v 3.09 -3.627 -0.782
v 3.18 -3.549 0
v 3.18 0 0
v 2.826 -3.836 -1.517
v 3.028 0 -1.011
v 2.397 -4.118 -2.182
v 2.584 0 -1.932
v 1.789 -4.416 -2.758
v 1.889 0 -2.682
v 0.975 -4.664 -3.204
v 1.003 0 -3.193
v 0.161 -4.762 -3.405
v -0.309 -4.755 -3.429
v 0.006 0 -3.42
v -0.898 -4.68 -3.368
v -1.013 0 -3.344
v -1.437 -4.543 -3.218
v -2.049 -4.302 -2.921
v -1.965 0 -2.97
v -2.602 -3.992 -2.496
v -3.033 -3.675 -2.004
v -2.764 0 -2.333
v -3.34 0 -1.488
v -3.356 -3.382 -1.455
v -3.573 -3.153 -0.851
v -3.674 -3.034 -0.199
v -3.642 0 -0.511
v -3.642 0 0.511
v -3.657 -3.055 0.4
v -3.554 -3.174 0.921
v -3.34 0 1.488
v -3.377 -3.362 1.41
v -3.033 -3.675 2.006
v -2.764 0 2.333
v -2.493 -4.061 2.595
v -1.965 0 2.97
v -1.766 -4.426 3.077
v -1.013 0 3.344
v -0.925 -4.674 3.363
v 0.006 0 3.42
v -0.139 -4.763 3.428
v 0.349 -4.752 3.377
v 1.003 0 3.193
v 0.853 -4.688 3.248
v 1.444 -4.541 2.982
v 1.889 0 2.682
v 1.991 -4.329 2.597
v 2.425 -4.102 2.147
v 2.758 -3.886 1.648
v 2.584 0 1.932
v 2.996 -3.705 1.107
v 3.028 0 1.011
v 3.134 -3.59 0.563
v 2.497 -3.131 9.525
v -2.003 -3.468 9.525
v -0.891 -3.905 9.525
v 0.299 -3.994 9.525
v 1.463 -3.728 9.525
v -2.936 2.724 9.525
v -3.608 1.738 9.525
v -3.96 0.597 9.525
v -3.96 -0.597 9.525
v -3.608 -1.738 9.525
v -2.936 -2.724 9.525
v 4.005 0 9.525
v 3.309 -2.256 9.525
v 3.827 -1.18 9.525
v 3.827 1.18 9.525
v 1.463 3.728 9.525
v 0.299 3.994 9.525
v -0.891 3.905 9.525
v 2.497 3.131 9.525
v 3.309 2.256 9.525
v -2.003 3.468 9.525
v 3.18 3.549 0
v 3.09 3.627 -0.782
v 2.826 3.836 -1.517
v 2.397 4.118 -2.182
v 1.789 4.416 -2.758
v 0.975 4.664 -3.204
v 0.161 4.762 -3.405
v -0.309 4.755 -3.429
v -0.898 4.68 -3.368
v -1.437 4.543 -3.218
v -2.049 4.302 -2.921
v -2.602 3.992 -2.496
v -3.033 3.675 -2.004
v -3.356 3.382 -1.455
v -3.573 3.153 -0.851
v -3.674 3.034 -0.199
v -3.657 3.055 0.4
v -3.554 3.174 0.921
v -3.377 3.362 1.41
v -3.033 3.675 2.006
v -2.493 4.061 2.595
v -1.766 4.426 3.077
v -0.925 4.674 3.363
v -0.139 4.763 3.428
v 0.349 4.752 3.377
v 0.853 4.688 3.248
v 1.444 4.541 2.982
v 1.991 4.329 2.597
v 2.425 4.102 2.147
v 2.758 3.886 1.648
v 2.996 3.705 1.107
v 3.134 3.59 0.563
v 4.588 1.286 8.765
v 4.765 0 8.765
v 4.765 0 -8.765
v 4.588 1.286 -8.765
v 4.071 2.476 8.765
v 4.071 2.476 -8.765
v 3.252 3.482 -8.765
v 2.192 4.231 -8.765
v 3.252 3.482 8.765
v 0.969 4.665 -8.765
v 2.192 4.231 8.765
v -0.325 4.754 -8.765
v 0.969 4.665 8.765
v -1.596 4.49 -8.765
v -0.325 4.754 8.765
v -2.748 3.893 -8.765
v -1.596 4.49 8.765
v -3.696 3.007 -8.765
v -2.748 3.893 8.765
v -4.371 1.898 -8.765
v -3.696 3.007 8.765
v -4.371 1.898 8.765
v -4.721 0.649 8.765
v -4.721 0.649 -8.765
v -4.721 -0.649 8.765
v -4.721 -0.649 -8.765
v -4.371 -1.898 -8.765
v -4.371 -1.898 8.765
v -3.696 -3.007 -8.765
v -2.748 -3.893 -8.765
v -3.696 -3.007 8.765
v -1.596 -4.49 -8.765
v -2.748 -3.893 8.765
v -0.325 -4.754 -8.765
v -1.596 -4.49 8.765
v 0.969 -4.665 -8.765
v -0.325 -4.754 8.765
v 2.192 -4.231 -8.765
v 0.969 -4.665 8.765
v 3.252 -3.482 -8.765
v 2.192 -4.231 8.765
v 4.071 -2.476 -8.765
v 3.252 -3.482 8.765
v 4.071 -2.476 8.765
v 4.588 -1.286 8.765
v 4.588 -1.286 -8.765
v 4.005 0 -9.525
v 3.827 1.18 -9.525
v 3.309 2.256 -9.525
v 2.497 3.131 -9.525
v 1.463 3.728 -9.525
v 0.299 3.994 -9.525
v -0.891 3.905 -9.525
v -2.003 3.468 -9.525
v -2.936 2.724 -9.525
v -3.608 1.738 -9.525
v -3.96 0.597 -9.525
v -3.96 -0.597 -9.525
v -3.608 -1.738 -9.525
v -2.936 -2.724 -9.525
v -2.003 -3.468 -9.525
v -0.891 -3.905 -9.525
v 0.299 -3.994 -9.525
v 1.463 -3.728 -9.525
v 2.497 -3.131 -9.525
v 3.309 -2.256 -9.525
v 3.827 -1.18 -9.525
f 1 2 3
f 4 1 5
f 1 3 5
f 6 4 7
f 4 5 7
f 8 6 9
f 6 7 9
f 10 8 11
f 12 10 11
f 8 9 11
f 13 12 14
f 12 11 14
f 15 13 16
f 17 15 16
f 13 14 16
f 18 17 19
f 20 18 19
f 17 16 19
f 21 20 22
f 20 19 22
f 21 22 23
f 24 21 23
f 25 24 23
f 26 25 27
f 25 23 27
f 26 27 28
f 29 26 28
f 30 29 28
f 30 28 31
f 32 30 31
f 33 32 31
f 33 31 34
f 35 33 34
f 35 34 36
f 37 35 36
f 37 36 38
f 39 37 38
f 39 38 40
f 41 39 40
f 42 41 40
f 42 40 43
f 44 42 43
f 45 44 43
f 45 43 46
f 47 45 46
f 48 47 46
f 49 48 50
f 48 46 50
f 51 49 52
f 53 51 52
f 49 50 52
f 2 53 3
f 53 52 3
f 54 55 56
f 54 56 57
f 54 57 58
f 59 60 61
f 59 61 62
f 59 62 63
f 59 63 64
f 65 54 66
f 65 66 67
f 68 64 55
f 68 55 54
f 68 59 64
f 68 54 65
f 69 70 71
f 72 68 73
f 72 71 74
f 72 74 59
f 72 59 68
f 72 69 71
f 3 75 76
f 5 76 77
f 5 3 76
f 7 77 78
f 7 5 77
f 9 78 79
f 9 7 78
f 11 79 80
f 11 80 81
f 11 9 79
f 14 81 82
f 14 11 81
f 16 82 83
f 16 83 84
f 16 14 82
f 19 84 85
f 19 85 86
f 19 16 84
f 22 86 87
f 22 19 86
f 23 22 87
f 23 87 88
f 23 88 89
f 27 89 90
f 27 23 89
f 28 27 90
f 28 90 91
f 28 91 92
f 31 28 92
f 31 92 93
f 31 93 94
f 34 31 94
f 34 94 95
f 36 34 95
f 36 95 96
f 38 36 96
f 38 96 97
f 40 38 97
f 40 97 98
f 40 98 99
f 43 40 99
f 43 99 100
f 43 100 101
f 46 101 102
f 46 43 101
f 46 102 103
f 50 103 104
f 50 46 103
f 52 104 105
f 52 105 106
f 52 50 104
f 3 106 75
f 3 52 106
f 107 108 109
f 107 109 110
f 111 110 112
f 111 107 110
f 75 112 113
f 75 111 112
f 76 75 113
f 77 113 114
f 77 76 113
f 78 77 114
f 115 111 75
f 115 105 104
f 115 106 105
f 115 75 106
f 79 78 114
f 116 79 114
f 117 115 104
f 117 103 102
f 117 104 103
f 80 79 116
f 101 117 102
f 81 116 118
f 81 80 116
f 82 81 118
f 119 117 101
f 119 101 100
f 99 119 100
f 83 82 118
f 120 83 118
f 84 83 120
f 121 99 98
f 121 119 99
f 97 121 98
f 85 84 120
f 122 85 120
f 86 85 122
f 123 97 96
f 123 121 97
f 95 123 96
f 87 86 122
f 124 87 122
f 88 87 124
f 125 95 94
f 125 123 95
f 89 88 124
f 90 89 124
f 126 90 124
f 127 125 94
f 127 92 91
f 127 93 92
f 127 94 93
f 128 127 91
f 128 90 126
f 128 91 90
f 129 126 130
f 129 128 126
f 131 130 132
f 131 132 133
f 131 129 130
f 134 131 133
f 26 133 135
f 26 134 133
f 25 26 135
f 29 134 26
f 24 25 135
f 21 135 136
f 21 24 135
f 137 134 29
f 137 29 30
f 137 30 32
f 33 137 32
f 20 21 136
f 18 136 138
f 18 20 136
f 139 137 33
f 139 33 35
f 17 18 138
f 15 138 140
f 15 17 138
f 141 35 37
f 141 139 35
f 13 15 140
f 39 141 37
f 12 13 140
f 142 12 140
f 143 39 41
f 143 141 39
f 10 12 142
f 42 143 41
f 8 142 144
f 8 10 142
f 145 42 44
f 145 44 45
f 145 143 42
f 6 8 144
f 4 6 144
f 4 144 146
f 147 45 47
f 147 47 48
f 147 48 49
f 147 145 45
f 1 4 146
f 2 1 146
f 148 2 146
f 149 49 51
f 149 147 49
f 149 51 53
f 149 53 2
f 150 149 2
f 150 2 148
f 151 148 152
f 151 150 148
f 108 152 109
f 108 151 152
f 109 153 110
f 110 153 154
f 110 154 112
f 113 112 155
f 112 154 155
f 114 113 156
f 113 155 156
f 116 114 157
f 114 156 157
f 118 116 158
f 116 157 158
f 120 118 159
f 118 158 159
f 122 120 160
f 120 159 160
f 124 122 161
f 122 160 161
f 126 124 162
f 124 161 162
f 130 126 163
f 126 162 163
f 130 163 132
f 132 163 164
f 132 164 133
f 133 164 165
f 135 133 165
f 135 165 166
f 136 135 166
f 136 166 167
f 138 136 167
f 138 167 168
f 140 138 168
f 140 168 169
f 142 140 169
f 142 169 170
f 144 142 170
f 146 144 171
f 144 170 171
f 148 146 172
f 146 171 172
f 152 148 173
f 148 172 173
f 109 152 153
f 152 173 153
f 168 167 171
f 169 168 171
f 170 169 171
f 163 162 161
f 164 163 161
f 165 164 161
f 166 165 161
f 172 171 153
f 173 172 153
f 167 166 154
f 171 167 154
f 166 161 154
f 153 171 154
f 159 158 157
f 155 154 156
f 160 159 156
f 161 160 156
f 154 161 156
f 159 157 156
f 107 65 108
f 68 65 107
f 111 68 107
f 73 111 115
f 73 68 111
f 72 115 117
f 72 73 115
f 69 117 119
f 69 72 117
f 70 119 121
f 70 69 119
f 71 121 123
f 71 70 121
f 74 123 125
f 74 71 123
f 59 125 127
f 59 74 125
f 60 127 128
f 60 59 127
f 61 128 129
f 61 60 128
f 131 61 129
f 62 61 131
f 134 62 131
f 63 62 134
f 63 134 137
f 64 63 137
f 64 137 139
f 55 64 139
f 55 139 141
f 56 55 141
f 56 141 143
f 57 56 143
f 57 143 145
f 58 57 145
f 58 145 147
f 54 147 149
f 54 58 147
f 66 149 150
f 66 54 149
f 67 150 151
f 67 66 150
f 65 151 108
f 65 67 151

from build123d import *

# Parameters (mm, degrees)
SKETCH1_R               = 4.765
BOSS_EXTRUDE1_DEPTH     = 9.525
CHAMFER1_SIZE           = 0.76
SKETCH2_R               = 3.43
CUT_EXTRUDE1_DEPTH      = 5.765
CUT_EXTRUDE1_DEPTH_BACK = 5.765


with BuildPart() as part:
    # Sketch1 → Boss-Extrude1 (new body, symmetric)
    with BuildSketch(Plane.XY):
        Circle(SKETCH1_R)
    extrude(amount=BOSS_EXTRUDE1_DEPTH, both=True)

    # Chamfer1
    chamfer1_edges = [part.edges().sort_by_distance(p)[0] for p in [
        (-4.765, 0, -9.525),
        (-4.765, 0, 9.525),
    ]]
    chamfer(chamfer1_edges, length=CHAMFER1_SIZE)

    # Sketch2 → Cut-Extrude1 (cut, two sides)
    with BuildSketch(Plane(origin=(0, 0, 0), x_dir=(1, 0, 0), z_dir=(0, 1, 0))) as cut_extrude1_sk:
        with Locations((-0.25, 0)):
            Circle(SKETCH2_R)
    extrude(amount=CUT_EXTRUDE1_DEPTH, mode=Mode.SUBTRACT)
    extrude(cut_extrude1_sk.sketch, amount=-CUT_EXTRUDE1_DEPTH_BACK, mode=Mode.SUBTRACT)


solid = part.part
